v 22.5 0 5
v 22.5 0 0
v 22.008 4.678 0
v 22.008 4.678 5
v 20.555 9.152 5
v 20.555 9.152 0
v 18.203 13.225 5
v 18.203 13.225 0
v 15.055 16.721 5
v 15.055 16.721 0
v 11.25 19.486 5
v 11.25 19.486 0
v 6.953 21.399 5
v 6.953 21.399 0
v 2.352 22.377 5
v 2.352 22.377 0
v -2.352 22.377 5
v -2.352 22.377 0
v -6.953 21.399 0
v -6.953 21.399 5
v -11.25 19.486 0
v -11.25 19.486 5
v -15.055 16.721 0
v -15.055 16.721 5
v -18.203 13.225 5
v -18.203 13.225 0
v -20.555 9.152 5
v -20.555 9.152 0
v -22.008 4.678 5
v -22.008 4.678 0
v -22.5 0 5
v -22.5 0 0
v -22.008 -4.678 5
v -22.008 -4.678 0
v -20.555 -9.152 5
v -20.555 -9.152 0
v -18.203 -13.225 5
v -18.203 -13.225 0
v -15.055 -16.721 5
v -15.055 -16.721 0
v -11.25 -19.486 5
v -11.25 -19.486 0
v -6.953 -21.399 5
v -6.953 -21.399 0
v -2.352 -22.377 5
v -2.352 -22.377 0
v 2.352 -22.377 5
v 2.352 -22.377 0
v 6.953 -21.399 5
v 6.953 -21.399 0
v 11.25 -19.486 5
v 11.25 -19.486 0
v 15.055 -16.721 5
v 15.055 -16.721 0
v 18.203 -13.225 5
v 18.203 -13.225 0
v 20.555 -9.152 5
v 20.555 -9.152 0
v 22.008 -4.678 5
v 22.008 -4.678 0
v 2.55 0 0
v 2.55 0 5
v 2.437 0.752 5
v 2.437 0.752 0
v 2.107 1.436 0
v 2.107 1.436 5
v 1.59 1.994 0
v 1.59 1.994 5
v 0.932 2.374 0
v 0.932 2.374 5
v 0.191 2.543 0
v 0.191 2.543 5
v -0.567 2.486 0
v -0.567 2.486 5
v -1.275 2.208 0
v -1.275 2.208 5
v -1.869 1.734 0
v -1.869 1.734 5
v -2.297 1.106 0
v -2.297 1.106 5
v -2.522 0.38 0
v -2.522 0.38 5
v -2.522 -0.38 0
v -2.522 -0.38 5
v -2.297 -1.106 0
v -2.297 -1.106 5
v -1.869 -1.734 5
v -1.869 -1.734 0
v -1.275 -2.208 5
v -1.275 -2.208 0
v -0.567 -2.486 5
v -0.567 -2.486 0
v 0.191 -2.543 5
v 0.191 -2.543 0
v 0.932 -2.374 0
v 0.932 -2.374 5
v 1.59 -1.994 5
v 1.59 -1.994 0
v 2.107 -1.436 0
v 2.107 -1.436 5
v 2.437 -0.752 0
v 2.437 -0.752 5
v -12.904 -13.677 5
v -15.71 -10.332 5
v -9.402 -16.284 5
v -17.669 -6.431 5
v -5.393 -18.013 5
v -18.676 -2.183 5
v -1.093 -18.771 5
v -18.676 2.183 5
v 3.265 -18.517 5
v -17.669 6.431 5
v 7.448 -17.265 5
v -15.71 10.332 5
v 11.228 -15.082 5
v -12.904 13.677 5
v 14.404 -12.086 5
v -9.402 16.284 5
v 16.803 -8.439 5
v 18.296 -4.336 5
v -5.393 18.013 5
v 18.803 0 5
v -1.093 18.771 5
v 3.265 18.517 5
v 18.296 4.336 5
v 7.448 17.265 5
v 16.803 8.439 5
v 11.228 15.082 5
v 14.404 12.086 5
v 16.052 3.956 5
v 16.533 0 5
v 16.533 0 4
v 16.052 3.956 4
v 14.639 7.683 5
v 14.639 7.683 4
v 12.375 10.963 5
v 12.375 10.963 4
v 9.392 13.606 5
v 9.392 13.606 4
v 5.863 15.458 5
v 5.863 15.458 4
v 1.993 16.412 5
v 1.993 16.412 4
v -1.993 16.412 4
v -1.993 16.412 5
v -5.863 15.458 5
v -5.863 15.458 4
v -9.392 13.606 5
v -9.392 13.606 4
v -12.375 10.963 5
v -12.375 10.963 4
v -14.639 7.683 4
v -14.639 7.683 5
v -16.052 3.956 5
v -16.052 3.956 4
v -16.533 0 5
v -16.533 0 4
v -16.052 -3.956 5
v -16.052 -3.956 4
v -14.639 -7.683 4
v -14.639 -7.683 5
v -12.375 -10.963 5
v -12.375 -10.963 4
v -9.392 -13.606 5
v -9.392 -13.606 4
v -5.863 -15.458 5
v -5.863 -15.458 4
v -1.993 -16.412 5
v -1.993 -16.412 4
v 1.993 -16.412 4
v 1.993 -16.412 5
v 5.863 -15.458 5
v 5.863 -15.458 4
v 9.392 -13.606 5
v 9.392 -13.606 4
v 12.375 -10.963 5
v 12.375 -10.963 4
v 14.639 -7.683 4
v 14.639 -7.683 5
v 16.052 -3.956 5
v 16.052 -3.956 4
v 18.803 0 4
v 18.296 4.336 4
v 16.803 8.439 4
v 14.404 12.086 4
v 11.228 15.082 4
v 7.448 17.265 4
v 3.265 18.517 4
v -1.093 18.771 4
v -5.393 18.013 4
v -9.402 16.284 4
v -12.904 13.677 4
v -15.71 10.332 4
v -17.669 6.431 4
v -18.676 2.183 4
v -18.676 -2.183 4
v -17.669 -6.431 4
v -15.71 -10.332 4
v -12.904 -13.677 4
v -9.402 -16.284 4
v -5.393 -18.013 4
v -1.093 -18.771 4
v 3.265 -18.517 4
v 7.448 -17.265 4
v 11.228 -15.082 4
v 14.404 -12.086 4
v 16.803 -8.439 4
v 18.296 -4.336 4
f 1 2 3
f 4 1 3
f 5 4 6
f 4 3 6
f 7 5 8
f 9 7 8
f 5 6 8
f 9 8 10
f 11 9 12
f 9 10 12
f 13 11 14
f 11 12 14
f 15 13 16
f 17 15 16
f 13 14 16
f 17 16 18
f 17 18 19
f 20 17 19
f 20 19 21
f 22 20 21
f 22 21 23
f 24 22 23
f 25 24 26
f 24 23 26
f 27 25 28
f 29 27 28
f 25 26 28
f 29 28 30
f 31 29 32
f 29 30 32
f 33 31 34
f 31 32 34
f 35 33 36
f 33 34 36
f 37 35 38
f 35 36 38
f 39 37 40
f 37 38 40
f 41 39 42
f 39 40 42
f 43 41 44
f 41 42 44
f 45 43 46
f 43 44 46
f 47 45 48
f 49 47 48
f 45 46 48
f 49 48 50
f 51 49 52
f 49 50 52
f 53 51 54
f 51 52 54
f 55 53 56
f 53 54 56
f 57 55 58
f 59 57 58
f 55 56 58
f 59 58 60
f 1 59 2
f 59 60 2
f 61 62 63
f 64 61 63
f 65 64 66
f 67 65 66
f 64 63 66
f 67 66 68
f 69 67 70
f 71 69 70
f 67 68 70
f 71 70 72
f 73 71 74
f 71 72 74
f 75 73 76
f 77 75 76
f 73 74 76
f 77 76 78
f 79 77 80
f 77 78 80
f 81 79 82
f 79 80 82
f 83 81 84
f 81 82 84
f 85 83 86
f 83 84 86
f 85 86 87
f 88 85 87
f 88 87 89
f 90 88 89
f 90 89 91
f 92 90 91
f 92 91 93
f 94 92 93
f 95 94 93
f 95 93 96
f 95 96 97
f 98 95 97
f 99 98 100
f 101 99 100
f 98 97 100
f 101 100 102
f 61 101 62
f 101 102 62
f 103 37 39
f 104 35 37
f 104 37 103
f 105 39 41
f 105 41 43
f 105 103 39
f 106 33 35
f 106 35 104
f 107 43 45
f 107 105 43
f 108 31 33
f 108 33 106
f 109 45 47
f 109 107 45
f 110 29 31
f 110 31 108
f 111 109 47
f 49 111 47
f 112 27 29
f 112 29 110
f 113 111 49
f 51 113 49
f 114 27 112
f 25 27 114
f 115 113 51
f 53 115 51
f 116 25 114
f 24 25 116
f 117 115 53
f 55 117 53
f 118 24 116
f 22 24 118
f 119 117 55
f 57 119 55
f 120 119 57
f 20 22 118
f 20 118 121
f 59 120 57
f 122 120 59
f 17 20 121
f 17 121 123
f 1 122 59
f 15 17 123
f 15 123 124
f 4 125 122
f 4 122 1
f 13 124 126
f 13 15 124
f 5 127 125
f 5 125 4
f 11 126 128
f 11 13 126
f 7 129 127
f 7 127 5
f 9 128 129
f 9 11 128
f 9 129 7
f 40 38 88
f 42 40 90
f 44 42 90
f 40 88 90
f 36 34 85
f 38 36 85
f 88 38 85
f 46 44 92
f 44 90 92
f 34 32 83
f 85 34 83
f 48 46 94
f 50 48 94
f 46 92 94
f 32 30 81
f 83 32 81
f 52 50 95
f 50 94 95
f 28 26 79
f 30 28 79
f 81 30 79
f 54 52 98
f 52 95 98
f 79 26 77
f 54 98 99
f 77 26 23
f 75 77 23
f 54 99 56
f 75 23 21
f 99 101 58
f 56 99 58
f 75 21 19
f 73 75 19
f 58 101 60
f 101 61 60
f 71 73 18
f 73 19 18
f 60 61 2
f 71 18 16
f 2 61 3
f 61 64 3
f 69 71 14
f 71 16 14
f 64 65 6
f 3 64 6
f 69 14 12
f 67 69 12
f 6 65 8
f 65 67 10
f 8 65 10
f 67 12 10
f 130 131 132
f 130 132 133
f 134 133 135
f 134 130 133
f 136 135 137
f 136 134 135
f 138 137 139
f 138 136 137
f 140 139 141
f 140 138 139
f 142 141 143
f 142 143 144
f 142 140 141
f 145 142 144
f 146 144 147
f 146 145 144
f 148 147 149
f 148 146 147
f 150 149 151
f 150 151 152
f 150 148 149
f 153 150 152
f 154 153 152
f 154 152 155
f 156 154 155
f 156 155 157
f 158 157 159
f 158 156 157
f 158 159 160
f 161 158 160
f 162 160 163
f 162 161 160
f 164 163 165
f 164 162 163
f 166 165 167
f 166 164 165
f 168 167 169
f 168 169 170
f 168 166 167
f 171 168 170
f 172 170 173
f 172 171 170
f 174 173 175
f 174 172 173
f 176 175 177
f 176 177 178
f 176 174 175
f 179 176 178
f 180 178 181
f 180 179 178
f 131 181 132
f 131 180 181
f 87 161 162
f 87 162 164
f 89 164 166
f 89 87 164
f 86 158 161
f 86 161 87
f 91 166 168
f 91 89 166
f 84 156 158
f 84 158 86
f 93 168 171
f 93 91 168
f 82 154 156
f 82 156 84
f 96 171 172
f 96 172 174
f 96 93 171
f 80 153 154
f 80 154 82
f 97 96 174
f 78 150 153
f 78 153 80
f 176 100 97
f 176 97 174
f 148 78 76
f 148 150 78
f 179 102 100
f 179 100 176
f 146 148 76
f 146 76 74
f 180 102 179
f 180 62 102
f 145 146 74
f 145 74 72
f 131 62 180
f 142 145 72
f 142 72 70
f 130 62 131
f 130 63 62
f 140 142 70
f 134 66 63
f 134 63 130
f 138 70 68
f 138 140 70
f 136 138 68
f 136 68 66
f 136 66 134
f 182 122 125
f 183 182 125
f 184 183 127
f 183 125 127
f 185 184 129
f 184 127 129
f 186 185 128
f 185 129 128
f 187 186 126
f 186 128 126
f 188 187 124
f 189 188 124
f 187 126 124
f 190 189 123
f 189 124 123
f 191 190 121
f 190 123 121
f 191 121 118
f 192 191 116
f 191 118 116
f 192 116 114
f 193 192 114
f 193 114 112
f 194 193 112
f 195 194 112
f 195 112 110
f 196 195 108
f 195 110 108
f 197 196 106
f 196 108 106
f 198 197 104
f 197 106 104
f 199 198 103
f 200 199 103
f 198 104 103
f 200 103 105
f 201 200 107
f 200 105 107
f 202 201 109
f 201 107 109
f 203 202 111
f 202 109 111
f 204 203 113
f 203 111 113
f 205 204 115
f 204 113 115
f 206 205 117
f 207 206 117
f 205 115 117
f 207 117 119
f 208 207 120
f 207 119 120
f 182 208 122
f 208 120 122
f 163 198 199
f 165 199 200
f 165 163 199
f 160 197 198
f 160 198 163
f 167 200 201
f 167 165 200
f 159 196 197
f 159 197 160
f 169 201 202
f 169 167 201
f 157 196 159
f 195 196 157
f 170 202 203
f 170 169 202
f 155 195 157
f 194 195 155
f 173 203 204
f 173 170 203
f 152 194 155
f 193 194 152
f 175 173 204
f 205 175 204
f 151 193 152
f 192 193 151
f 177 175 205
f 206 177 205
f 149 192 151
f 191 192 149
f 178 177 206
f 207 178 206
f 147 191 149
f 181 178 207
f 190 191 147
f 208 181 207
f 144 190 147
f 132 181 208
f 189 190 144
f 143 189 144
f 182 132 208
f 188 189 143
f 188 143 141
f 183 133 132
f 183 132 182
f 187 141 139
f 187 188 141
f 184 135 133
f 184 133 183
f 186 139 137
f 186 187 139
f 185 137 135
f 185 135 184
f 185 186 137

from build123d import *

# Parameters (mm, degrees)
ESQUISSE1_R             = 22.5
BOSS_EXTRU_1_DEPTH      = 5
ESQUISSE6_R             = 2.55
ENL_V_MAT_EXTRU_4_DEPTH = 5
ESQUISSE7_R             = 18.80314531
ESQUISSE7_R_2           = 16.53251654
ENL_V_MAT_EXTRU_5_DEPTH = 1


with BuildPart() as part:
    # Esquisse1 → Boss.-Extru.1 (new body)
    with BuildSketch(Plane.XY):
        Circle(ESQUISSE1_R)
    extrude(amount=BOSS_EXTRU_1_DEPTH)

    # Esquisse6 → Enlèv. mat.-Extru.4 (cut)
    with BuildSketch(Plane.XY.offset(5)):
        Circle(ESQUISSE6_R)
    extrude(amount=-ENL_V_MAT_EXTRU_4_DEPTH, mode=Mode.SUBTRACT)

    # Esquisse7 → Enlèv. mat.-Extru.5 (cut)
    with BuildSketch(Plane.XY.offset(5)):
        Circle(ESQUISSE7_R)
        Circle(ESQUISSE7_R_2, mode=Mode.SUBTRACT)
    extrude(amount=-ENL_V_MAT_EXTRU_5_DEPTH, mode=Mode.SUBTRACT)


solid = part.part
